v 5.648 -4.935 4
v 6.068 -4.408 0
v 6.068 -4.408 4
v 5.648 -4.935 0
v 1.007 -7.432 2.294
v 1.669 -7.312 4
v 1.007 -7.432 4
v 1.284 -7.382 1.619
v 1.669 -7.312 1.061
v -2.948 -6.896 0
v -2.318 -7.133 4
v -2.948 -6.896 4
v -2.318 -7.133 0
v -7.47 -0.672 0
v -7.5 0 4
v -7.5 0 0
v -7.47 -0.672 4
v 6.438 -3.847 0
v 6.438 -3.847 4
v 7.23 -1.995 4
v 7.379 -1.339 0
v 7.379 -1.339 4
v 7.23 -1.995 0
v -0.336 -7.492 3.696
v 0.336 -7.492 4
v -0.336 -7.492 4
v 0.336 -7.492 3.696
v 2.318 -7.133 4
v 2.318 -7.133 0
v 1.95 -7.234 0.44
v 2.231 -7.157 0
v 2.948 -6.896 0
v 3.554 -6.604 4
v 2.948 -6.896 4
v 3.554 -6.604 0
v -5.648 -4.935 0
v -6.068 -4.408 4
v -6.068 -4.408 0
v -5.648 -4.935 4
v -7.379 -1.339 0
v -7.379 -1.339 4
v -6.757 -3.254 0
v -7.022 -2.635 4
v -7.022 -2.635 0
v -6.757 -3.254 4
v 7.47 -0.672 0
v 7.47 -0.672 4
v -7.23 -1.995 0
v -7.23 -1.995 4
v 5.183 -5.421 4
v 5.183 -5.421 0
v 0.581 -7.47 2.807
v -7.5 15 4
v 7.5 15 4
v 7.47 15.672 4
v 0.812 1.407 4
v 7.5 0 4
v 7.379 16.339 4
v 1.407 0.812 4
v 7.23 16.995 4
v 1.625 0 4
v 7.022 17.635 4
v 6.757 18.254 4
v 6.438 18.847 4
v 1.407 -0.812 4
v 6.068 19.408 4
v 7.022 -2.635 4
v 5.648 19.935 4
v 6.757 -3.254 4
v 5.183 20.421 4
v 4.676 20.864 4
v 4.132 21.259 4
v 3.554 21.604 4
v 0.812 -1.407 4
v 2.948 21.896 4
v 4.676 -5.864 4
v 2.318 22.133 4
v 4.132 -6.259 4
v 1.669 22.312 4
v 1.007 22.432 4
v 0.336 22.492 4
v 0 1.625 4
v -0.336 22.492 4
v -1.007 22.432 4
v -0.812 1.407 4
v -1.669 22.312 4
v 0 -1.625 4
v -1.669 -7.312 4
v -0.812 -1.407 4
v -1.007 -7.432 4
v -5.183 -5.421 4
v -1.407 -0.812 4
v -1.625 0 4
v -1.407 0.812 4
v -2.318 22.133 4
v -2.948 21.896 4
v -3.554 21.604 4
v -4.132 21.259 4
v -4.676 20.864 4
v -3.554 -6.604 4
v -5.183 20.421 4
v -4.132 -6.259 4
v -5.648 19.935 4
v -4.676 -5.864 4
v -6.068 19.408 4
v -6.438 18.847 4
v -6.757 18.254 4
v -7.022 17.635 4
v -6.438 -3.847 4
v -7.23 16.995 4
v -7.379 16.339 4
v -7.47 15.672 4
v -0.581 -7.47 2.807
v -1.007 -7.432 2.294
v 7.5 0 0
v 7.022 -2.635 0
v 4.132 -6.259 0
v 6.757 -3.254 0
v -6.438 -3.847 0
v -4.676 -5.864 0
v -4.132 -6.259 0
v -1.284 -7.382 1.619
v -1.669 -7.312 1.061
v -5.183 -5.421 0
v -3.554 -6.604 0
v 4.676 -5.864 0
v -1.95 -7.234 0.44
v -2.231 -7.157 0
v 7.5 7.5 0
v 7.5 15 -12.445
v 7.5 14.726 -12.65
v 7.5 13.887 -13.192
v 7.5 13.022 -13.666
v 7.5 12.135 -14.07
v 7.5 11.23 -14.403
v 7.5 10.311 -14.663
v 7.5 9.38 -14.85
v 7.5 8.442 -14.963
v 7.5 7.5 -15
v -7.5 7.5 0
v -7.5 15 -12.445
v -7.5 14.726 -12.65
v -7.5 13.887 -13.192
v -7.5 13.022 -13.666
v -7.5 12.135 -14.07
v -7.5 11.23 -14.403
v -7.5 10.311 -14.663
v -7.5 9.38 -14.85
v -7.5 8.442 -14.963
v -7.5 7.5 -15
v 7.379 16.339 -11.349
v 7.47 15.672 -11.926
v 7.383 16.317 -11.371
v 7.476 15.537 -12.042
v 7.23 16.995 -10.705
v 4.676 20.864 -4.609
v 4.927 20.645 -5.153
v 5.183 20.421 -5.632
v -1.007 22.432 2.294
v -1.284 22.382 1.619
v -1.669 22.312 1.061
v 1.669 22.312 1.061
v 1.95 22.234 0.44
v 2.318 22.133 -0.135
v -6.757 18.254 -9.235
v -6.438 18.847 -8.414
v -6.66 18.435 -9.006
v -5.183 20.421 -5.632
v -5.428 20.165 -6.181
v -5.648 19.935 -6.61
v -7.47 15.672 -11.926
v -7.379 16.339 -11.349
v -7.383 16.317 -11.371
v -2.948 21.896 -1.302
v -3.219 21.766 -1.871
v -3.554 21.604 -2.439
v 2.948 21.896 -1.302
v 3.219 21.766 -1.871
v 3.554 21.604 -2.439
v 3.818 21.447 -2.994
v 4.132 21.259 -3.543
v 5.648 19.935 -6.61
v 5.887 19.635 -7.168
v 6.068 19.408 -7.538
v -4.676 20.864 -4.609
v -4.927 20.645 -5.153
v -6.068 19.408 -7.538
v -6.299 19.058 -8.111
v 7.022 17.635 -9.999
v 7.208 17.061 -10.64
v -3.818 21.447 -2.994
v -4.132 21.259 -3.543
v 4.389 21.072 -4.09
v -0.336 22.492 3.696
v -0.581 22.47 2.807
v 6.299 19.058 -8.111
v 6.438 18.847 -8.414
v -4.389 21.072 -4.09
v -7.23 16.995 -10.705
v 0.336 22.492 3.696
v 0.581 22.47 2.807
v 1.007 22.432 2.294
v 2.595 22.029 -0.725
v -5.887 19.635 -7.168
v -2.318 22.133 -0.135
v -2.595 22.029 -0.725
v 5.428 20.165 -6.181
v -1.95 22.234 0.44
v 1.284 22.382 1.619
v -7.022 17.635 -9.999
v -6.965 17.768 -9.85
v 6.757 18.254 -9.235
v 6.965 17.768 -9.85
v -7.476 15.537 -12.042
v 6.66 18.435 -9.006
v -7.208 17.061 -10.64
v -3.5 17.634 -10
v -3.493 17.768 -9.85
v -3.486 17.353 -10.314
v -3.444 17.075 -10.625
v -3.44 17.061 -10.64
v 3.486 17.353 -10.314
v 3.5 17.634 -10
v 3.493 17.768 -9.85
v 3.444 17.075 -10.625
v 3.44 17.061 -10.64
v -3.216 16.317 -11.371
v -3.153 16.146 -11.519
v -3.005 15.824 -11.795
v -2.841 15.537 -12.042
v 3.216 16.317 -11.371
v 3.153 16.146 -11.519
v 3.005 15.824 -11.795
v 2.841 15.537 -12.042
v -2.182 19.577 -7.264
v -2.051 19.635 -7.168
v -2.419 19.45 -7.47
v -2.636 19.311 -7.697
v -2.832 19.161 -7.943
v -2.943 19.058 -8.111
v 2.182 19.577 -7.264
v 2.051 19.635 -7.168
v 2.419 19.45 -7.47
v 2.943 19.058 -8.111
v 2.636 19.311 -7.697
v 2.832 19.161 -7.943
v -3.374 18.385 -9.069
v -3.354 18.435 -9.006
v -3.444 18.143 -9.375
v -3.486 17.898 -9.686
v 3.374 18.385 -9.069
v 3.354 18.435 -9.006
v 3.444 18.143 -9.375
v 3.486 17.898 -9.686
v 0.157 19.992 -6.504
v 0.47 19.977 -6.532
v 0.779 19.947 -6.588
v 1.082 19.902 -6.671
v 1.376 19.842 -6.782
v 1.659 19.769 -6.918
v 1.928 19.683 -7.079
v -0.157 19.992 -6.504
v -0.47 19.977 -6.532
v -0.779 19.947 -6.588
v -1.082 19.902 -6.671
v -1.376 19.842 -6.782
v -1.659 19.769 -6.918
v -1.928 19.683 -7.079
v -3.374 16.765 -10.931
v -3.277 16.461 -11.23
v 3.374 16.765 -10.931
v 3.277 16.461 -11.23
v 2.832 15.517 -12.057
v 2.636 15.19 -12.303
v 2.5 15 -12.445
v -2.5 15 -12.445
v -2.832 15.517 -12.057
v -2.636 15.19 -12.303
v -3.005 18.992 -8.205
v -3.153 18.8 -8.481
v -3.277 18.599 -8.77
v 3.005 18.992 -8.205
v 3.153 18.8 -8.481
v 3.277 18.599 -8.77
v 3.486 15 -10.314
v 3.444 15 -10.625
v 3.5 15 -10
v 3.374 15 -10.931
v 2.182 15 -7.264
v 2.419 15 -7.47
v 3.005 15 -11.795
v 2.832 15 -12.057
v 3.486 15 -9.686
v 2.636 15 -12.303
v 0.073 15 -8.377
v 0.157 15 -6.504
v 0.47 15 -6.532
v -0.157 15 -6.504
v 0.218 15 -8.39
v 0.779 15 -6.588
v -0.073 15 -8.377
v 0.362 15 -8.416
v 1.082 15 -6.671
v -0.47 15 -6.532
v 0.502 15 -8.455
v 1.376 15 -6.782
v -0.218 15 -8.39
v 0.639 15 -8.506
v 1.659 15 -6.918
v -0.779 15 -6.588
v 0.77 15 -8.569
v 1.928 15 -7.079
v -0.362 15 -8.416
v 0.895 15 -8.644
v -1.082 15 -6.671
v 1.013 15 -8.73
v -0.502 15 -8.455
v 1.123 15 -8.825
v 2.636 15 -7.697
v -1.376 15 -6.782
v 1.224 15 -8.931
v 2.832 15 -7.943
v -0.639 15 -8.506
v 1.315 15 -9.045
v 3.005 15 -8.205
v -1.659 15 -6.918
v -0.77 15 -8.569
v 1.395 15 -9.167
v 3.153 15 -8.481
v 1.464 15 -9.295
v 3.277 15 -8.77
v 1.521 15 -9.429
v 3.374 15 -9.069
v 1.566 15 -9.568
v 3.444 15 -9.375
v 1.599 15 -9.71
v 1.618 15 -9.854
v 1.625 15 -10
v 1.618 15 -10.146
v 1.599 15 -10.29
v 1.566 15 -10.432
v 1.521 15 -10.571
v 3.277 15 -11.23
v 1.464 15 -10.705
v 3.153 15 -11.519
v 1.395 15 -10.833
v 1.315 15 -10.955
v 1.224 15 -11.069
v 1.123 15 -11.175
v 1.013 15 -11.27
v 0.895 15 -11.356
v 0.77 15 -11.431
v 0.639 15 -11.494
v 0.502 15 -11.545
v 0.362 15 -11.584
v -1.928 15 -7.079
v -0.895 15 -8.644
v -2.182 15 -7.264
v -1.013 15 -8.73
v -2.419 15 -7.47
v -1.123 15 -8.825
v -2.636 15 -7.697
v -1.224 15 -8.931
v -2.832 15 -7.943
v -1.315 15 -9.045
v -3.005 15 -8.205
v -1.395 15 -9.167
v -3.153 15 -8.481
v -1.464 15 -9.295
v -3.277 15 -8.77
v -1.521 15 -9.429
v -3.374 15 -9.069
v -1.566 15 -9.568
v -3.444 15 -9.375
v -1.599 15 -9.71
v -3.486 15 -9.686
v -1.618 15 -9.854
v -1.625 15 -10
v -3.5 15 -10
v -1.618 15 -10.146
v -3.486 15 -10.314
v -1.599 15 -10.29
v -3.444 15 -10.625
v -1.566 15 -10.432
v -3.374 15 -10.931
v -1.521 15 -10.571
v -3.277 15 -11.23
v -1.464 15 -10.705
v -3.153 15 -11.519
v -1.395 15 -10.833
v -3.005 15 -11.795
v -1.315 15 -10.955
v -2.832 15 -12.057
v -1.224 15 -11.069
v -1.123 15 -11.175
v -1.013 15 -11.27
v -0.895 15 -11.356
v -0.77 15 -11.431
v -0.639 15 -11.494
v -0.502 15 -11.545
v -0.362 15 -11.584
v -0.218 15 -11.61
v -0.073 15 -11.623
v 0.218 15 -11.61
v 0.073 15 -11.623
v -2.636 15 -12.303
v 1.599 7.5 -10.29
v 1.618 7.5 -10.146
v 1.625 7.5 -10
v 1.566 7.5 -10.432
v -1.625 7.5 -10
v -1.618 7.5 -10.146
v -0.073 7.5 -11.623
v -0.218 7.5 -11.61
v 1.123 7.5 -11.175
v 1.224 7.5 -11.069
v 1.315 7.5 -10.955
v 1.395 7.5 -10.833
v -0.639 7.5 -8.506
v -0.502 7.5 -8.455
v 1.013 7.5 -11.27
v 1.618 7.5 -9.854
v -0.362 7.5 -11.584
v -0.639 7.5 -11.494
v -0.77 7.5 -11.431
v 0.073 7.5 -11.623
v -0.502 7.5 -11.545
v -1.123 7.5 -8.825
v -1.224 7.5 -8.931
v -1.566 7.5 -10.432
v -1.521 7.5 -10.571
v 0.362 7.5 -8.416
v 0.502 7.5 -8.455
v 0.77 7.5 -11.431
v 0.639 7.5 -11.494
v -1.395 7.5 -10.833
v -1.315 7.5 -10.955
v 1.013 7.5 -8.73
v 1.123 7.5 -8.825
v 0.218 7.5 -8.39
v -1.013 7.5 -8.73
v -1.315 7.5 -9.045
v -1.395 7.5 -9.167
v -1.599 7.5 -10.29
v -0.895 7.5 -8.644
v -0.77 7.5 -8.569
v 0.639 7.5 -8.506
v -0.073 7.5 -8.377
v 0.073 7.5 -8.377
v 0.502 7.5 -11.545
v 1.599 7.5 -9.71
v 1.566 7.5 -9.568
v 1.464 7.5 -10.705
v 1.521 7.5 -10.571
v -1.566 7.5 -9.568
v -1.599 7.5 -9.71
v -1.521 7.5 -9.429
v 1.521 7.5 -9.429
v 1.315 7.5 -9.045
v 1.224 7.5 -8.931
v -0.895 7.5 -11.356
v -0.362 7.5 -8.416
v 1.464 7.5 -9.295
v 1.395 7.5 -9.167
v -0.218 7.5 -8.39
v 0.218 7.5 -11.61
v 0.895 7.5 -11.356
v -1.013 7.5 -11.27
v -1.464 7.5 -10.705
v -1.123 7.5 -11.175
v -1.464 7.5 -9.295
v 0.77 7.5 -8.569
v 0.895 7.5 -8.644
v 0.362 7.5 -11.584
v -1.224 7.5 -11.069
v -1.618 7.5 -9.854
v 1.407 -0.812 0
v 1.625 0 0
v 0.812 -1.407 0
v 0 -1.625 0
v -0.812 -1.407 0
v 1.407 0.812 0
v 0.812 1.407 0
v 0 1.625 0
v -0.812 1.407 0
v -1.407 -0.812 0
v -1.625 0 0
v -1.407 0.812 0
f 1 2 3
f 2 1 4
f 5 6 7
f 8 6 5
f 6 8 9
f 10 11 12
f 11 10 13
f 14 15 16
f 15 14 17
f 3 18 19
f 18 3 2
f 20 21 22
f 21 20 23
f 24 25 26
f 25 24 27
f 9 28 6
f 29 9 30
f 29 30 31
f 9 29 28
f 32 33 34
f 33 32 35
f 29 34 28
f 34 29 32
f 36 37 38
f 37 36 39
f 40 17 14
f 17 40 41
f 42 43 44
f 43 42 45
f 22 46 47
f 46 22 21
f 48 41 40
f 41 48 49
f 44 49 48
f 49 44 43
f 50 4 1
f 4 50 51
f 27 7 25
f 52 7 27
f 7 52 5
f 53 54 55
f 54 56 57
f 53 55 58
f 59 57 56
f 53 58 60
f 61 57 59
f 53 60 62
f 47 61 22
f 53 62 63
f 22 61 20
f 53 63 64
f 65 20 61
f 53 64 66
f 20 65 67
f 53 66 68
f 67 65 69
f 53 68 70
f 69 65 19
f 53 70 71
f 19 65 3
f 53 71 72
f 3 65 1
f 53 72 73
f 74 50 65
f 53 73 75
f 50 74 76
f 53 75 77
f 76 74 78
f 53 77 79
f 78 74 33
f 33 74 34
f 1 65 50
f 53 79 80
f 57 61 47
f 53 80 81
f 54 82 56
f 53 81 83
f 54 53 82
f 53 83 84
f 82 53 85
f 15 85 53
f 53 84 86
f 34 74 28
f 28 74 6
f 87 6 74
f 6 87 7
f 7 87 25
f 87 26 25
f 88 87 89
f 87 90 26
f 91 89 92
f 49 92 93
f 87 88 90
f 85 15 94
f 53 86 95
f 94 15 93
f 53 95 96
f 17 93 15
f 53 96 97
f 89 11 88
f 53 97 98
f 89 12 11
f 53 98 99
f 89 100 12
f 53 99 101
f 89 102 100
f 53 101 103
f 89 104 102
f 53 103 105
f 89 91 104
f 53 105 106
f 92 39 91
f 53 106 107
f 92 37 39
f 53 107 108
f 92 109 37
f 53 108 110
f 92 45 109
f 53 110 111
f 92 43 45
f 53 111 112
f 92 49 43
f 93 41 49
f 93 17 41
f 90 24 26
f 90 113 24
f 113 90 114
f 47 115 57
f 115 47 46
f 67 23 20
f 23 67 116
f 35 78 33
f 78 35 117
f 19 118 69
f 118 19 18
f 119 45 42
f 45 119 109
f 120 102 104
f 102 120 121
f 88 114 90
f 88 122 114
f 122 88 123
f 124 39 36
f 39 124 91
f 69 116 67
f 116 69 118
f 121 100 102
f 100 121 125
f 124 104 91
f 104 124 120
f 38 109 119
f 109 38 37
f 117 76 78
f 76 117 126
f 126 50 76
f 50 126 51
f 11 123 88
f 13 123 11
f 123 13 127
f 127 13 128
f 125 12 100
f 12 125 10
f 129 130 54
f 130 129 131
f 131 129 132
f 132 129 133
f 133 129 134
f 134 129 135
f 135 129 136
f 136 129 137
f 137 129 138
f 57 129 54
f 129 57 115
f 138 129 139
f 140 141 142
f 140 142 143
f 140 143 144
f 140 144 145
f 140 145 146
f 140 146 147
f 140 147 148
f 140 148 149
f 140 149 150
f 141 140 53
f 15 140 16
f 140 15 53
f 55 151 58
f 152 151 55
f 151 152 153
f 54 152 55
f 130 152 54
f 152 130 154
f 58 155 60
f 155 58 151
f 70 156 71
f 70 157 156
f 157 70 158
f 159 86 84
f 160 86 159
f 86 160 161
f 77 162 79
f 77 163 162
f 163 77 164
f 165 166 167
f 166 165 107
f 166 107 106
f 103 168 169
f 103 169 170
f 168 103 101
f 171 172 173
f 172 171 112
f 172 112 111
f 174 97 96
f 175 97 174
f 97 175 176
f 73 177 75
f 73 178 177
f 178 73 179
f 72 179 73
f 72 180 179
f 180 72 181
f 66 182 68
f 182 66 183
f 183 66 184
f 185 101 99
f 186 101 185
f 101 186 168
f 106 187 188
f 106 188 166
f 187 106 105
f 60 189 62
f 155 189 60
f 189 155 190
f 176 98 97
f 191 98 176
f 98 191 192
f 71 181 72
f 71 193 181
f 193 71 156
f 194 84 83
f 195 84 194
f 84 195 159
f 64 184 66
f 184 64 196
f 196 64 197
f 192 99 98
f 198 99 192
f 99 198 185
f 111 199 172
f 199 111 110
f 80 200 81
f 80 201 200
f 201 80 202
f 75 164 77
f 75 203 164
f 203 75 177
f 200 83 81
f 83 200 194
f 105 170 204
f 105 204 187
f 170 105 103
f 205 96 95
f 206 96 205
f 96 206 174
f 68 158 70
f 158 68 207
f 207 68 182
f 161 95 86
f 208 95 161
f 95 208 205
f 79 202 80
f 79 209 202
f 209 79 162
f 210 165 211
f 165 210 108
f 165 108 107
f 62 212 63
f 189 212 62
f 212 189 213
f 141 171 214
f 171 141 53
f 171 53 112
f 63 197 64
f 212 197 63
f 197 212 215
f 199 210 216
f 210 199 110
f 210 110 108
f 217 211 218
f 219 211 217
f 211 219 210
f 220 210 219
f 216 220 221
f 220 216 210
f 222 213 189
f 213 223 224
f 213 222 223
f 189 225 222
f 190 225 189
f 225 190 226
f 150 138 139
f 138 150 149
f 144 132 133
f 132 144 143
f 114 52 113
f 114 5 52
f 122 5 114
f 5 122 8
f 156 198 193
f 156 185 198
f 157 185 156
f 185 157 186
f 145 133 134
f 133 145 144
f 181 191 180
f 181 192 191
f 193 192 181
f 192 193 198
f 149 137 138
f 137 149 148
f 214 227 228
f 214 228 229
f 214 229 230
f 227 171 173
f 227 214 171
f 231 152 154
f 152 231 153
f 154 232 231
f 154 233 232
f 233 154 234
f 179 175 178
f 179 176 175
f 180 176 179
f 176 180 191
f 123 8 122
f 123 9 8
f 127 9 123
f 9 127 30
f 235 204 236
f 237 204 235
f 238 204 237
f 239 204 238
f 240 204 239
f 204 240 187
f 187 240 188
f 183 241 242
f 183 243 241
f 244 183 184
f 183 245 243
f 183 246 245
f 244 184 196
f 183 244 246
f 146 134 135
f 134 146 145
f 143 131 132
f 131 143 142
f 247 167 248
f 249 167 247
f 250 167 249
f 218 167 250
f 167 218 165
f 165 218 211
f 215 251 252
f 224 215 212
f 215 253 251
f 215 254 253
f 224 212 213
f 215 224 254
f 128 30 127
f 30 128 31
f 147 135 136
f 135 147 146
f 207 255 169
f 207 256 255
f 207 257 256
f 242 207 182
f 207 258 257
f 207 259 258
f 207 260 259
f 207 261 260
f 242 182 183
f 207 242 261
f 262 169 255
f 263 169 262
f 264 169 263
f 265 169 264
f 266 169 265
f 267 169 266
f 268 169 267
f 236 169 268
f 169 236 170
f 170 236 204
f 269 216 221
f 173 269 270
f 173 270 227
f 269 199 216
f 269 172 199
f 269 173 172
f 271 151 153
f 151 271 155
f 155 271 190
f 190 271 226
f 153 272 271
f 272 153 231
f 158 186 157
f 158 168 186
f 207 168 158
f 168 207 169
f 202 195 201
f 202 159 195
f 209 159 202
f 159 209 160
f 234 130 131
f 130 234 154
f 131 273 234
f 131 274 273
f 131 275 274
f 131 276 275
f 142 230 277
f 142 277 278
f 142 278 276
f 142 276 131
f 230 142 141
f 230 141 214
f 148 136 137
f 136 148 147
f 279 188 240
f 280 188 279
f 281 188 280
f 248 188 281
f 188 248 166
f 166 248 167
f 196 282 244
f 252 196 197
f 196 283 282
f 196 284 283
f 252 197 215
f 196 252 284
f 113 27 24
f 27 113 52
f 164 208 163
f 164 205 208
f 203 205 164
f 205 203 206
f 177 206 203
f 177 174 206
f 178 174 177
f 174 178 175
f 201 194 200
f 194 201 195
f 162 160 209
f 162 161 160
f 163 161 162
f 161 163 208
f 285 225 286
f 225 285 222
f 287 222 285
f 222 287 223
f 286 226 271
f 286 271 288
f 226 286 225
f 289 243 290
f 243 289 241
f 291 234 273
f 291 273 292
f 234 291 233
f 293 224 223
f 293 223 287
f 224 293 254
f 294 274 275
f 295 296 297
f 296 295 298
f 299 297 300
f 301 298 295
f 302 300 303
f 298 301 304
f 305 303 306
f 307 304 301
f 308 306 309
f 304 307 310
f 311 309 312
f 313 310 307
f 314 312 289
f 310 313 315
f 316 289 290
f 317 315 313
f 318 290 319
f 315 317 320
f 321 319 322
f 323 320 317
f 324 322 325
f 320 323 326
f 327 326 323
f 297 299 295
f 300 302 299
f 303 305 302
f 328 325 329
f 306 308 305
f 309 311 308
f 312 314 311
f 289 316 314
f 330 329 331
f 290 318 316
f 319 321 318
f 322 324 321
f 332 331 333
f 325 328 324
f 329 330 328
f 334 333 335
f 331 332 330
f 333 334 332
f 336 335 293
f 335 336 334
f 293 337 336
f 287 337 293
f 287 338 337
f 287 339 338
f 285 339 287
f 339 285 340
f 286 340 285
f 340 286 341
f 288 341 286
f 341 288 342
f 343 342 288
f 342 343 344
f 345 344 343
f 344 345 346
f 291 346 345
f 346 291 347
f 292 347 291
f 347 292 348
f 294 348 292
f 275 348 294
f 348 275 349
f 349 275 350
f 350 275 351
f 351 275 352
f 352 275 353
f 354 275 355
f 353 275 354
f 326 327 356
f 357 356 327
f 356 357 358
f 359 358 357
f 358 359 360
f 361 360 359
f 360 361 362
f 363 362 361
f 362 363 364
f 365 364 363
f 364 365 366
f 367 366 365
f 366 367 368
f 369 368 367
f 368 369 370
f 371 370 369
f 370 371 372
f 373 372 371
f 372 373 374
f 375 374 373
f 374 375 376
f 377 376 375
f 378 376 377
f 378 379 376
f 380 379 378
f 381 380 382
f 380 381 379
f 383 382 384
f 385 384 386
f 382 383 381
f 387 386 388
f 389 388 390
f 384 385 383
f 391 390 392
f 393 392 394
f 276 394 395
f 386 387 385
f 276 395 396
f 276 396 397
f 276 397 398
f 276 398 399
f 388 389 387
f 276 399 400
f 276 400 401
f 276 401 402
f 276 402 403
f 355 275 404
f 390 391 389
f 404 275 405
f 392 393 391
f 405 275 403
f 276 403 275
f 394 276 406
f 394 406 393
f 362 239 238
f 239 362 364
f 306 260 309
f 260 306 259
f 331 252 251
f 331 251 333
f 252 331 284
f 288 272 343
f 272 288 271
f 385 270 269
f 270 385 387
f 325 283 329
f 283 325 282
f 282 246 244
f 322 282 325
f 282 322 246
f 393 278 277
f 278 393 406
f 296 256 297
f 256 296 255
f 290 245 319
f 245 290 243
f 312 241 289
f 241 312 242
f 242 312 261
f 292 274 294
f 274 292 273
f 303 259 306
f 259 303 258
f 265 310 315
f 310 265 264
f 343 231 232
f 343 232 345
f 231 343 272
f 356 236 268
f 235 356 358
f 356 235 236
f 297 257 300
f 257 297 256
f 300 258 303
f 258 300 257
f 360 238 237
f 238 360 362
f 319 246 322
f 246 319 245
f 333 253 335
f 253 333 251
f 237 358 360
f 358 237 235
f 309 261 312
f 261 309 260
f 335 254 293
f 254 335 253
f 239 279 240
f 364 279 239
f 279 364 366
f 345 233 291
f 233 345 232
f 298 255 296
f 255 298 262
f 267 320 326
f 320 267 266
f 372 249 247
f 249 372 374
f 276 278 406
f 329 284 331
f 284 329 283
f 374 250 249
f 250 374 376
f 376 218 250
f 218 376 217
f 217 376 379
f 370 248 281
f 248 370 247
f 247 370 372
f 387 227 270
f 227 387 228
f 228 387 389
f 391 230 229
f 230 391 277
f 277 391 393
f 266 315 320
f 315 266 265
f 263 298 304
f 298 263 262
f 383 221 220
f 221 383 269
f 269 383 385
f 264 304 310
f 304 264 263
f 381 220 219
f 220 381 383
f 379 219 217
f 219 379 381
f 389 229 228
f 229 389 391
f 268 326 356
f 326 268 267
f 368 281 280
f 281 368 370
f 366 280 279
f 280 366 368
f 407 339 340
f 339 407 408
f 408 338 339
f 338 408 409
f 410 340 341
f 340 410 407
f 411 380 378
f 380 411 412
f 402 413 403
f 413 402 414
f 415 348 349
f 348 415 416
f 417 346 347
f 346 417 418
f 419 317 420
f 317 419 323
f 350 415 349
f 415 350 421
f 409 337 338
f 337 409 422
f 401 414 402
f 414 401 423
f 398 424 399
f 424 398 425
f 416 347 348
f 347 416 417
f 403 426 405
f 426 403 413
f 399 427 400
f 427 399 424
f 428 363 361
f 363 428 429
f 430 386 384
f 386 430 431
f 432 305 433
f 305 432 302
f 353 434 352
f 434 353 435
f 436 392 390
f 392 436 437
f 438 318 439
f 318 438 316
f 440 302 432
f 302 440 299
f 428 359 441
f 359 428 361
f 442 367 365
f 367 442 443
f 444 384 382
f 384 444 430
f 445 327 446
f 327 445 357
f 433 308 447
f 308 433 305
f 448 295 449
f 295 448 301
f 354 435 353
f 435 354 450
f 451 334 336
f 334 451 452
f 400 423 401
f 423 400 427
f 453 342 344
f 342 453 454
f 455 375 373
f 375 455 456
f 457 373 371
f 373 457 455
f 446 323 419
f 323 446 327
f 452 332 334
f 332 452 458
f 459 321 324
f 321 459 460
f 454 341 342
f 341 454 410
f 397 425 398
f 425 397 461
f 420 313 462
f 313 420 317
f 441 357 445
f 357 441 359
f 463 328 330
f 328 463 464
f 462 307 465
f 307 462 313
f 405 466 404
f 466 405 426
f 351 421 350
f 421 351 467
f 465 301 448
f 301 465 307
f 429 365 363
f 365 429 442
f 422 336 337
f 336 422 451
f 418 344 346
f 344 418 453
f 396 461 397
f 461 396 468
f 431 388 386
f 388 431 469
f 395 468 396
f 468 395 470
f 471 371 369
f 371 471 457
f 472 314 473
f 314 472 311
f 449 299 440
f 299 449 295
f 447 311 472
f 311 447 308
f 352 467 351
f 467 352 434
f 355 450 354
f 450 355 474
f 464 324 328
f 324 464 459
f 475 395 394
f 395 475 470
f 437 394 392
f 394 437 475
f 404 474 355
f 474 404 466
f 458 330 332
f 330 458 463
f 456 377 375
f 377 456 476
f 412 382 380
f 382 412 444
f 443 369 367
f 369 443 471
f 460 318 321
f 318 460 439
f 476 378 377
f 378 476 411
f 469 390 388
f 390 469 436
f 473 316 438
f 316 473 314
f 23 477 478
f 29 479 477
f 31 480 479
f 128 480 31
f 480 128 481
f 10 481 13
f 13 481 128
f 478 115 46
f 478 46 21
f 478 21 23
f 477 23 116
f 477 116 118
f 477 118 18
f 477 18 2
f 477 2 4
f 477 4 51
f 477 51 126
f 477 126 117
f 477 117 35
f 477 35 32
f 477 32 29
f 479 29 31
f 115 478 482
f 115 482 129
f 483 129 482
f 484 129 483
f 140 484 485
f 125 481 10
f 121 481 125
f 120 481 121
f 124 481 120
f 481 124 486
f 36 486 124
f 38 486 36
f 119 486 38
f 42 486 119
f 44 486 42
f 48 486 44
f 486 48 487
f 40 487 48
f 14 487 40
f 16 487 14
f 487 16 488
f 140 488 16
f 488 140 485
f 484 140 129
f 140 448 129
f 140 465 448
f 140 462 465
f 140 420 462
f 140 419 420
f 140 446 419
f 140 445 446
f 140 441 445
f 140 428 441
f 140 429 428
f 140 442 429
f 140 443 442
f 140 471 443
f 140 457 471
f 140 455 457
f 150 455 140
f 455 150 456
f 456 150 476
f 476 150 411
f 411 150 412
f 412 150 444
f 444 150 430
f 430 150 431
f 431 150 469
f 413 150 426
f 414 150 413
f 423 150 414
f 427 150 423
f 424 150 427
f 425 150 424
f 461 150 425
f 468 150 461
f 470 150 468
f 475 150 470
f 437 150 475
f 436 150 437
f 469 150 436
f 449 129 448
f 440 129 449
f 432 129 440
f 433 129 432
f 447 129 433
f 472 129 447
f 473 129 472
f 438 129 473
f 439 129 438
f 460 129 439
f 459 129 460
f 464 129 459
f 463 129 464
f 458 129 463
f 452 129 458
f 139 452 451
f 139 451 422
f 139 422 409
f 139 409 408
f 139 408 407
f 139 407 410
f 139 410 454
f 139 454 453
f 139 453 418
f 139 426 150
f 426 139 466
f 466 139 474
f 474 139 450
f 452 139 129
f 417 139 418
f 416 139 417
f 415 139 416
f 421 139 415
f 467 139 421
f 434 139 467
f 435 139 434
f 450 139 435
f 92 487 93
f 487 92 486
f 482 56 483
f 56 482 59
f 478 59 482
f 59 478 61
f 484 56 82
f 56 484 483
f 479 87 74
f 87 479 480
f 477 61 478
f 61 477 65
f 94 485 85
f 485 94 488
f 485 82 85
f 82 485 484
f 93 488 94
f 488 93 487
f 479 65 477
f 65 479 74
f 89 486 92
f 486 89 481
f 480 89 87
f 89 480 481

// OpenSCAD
// file: configuration.scad
// Increase this if your slicer or printer make holes too tight.
extra_radius = 0.0;

// OD = outside diameter, corner to corner.
m3_nut_od = 6.1;
m3_nut_radius = m3_nut_od/2 + 0.2 + extra_radius;
m3_washer_radius = 3.5 + extra_radius;

// Major diameter of metric 3mm thread.
m3_major = 2.85;
m3_radius = m3_major/2 + extra_radius;
m3_wide_radius = m3_major/2 + extra_radius + 0.2;

// NEMA17 stepper motors.
motor_shaft_diameter = 5;
motor_shaft_radius = motor_shaft_diameter/2 + extra_radius;

// Frame brackets. M3x8mm screws work best with 3.6 mm brackets.
thickness = 3.6;

// OpenBeam or Misumi. Currently only 15x15 mm, but there is a plan
// to make models more parametric and allow 20x20 mm in the future.
extrusion = 15;

// Placement for the NEMA17 stepper motors.
motor_offset = 44;
motor_length = 47;
motor_z_offset = 30;

// My addtions
rod_len = 380; // length of horizontal rods
base_height = 7; //measured in multiples of extrusion = 15mm
vertical_h = 800; // length of vertical rods

//ad hoc formula to get radius from horizontal length
// radius is geometric center to center of vertical rods 
r = (rod_len + 100*sin(30) + 2) / (2*cos(30)) - 17;
//r + 17 is the radius of the triangle defined by the inner edges of of the horizontal rods
//where the radius of a an equilateral triangle is the dist from center to the center of one of the edges.
// main file
include <configuration.scad>;

sticky_width = 30;
sticky_length = 25.4;
sticky_offset = 8;  // Distance from screw center to glass edge.
thickness2 = 5;
$fn = 70;

// Make the round edge line up with the outside of OpenBeam.
screw_offset = sticky_width/2 - 7.5;
cube_length = sticky_length + sticky_offset - screw_offset;

module glass_tab() {
  difference() {
    translate([0, screw_offset, 0]) union() {
      cylinder(r=sticky_width/2, h=thickness2, center=true);
      translate([-sticky_width/2, 0, -thickness2/2 - extrusion])
      intersection() {
        cube([sticky_width, cube_length, thickness2 + extrusion]);
        
        translate([0,0,thickness2 + extrusion + 10])
        rotate([0,90,0])
        cylinder(r = cube_length, h = sticky_width);
      }
    }
    cylinder(r=m3_wide_radius, h=20, center=true, $fn=12);
    
    translate([0,0,-thickness2/2 - extrusion/2])
    rotate([-90,0,0])
    cylinder(r = 3, h = 50);
  }
  // Scotch restickable tab for mounting.
  translate([0, sticky_length/2+sticky_offset, thickness2/2]) %
    cube([sticky_width, sticky_length, 0.7], center=true);
  // Horizontal OpenBeam.
  translate([0, 0, (15+thickness2)/-2]) %
    cube([100, 15, 15], center=true);
}

module glass_tab2(l, w, h) {
    difference() {
    intersection() {
    translate([0,0,-extrusion])
    union() {
        cylinder(r = w/2, h = h);
        translate([-w/2, 0, 0]) cube([w,l,h]);
        translate([0, l, 0]) cylinder(r = w/2, h = h);
    }
    translate([0,extrusion/2,h-extrusion])
    rotate([0,90,0]) 
    scale([h, (l + w - extrusion), 1])
    cylinder(r = 1, h = w + 2, center = true, $fn = 100);
    
    }
    translate([0, 0, -15/2])
    cube([100, 15, 15], center=true);
    
    
    cylinder(r=m3_wide_radius, h=20, center=true, $fn=12);
    
    translate([0,0,-thickness2/2 - extrusion/2])
    rotate([-90,0,0])
    union() {
        translate([0,0,l]) cylinder(r = m3_washer_radius, h = 50);
        cylinder(r = m3_wide_radius, h = 50);
    }
    }
}
glass_tab2(15, 15, 15 + 4);

  // Horizontal OpenBeam.
  translate([0, 0, -15/2]) %
    cube([100, 15, 15], center=true);
